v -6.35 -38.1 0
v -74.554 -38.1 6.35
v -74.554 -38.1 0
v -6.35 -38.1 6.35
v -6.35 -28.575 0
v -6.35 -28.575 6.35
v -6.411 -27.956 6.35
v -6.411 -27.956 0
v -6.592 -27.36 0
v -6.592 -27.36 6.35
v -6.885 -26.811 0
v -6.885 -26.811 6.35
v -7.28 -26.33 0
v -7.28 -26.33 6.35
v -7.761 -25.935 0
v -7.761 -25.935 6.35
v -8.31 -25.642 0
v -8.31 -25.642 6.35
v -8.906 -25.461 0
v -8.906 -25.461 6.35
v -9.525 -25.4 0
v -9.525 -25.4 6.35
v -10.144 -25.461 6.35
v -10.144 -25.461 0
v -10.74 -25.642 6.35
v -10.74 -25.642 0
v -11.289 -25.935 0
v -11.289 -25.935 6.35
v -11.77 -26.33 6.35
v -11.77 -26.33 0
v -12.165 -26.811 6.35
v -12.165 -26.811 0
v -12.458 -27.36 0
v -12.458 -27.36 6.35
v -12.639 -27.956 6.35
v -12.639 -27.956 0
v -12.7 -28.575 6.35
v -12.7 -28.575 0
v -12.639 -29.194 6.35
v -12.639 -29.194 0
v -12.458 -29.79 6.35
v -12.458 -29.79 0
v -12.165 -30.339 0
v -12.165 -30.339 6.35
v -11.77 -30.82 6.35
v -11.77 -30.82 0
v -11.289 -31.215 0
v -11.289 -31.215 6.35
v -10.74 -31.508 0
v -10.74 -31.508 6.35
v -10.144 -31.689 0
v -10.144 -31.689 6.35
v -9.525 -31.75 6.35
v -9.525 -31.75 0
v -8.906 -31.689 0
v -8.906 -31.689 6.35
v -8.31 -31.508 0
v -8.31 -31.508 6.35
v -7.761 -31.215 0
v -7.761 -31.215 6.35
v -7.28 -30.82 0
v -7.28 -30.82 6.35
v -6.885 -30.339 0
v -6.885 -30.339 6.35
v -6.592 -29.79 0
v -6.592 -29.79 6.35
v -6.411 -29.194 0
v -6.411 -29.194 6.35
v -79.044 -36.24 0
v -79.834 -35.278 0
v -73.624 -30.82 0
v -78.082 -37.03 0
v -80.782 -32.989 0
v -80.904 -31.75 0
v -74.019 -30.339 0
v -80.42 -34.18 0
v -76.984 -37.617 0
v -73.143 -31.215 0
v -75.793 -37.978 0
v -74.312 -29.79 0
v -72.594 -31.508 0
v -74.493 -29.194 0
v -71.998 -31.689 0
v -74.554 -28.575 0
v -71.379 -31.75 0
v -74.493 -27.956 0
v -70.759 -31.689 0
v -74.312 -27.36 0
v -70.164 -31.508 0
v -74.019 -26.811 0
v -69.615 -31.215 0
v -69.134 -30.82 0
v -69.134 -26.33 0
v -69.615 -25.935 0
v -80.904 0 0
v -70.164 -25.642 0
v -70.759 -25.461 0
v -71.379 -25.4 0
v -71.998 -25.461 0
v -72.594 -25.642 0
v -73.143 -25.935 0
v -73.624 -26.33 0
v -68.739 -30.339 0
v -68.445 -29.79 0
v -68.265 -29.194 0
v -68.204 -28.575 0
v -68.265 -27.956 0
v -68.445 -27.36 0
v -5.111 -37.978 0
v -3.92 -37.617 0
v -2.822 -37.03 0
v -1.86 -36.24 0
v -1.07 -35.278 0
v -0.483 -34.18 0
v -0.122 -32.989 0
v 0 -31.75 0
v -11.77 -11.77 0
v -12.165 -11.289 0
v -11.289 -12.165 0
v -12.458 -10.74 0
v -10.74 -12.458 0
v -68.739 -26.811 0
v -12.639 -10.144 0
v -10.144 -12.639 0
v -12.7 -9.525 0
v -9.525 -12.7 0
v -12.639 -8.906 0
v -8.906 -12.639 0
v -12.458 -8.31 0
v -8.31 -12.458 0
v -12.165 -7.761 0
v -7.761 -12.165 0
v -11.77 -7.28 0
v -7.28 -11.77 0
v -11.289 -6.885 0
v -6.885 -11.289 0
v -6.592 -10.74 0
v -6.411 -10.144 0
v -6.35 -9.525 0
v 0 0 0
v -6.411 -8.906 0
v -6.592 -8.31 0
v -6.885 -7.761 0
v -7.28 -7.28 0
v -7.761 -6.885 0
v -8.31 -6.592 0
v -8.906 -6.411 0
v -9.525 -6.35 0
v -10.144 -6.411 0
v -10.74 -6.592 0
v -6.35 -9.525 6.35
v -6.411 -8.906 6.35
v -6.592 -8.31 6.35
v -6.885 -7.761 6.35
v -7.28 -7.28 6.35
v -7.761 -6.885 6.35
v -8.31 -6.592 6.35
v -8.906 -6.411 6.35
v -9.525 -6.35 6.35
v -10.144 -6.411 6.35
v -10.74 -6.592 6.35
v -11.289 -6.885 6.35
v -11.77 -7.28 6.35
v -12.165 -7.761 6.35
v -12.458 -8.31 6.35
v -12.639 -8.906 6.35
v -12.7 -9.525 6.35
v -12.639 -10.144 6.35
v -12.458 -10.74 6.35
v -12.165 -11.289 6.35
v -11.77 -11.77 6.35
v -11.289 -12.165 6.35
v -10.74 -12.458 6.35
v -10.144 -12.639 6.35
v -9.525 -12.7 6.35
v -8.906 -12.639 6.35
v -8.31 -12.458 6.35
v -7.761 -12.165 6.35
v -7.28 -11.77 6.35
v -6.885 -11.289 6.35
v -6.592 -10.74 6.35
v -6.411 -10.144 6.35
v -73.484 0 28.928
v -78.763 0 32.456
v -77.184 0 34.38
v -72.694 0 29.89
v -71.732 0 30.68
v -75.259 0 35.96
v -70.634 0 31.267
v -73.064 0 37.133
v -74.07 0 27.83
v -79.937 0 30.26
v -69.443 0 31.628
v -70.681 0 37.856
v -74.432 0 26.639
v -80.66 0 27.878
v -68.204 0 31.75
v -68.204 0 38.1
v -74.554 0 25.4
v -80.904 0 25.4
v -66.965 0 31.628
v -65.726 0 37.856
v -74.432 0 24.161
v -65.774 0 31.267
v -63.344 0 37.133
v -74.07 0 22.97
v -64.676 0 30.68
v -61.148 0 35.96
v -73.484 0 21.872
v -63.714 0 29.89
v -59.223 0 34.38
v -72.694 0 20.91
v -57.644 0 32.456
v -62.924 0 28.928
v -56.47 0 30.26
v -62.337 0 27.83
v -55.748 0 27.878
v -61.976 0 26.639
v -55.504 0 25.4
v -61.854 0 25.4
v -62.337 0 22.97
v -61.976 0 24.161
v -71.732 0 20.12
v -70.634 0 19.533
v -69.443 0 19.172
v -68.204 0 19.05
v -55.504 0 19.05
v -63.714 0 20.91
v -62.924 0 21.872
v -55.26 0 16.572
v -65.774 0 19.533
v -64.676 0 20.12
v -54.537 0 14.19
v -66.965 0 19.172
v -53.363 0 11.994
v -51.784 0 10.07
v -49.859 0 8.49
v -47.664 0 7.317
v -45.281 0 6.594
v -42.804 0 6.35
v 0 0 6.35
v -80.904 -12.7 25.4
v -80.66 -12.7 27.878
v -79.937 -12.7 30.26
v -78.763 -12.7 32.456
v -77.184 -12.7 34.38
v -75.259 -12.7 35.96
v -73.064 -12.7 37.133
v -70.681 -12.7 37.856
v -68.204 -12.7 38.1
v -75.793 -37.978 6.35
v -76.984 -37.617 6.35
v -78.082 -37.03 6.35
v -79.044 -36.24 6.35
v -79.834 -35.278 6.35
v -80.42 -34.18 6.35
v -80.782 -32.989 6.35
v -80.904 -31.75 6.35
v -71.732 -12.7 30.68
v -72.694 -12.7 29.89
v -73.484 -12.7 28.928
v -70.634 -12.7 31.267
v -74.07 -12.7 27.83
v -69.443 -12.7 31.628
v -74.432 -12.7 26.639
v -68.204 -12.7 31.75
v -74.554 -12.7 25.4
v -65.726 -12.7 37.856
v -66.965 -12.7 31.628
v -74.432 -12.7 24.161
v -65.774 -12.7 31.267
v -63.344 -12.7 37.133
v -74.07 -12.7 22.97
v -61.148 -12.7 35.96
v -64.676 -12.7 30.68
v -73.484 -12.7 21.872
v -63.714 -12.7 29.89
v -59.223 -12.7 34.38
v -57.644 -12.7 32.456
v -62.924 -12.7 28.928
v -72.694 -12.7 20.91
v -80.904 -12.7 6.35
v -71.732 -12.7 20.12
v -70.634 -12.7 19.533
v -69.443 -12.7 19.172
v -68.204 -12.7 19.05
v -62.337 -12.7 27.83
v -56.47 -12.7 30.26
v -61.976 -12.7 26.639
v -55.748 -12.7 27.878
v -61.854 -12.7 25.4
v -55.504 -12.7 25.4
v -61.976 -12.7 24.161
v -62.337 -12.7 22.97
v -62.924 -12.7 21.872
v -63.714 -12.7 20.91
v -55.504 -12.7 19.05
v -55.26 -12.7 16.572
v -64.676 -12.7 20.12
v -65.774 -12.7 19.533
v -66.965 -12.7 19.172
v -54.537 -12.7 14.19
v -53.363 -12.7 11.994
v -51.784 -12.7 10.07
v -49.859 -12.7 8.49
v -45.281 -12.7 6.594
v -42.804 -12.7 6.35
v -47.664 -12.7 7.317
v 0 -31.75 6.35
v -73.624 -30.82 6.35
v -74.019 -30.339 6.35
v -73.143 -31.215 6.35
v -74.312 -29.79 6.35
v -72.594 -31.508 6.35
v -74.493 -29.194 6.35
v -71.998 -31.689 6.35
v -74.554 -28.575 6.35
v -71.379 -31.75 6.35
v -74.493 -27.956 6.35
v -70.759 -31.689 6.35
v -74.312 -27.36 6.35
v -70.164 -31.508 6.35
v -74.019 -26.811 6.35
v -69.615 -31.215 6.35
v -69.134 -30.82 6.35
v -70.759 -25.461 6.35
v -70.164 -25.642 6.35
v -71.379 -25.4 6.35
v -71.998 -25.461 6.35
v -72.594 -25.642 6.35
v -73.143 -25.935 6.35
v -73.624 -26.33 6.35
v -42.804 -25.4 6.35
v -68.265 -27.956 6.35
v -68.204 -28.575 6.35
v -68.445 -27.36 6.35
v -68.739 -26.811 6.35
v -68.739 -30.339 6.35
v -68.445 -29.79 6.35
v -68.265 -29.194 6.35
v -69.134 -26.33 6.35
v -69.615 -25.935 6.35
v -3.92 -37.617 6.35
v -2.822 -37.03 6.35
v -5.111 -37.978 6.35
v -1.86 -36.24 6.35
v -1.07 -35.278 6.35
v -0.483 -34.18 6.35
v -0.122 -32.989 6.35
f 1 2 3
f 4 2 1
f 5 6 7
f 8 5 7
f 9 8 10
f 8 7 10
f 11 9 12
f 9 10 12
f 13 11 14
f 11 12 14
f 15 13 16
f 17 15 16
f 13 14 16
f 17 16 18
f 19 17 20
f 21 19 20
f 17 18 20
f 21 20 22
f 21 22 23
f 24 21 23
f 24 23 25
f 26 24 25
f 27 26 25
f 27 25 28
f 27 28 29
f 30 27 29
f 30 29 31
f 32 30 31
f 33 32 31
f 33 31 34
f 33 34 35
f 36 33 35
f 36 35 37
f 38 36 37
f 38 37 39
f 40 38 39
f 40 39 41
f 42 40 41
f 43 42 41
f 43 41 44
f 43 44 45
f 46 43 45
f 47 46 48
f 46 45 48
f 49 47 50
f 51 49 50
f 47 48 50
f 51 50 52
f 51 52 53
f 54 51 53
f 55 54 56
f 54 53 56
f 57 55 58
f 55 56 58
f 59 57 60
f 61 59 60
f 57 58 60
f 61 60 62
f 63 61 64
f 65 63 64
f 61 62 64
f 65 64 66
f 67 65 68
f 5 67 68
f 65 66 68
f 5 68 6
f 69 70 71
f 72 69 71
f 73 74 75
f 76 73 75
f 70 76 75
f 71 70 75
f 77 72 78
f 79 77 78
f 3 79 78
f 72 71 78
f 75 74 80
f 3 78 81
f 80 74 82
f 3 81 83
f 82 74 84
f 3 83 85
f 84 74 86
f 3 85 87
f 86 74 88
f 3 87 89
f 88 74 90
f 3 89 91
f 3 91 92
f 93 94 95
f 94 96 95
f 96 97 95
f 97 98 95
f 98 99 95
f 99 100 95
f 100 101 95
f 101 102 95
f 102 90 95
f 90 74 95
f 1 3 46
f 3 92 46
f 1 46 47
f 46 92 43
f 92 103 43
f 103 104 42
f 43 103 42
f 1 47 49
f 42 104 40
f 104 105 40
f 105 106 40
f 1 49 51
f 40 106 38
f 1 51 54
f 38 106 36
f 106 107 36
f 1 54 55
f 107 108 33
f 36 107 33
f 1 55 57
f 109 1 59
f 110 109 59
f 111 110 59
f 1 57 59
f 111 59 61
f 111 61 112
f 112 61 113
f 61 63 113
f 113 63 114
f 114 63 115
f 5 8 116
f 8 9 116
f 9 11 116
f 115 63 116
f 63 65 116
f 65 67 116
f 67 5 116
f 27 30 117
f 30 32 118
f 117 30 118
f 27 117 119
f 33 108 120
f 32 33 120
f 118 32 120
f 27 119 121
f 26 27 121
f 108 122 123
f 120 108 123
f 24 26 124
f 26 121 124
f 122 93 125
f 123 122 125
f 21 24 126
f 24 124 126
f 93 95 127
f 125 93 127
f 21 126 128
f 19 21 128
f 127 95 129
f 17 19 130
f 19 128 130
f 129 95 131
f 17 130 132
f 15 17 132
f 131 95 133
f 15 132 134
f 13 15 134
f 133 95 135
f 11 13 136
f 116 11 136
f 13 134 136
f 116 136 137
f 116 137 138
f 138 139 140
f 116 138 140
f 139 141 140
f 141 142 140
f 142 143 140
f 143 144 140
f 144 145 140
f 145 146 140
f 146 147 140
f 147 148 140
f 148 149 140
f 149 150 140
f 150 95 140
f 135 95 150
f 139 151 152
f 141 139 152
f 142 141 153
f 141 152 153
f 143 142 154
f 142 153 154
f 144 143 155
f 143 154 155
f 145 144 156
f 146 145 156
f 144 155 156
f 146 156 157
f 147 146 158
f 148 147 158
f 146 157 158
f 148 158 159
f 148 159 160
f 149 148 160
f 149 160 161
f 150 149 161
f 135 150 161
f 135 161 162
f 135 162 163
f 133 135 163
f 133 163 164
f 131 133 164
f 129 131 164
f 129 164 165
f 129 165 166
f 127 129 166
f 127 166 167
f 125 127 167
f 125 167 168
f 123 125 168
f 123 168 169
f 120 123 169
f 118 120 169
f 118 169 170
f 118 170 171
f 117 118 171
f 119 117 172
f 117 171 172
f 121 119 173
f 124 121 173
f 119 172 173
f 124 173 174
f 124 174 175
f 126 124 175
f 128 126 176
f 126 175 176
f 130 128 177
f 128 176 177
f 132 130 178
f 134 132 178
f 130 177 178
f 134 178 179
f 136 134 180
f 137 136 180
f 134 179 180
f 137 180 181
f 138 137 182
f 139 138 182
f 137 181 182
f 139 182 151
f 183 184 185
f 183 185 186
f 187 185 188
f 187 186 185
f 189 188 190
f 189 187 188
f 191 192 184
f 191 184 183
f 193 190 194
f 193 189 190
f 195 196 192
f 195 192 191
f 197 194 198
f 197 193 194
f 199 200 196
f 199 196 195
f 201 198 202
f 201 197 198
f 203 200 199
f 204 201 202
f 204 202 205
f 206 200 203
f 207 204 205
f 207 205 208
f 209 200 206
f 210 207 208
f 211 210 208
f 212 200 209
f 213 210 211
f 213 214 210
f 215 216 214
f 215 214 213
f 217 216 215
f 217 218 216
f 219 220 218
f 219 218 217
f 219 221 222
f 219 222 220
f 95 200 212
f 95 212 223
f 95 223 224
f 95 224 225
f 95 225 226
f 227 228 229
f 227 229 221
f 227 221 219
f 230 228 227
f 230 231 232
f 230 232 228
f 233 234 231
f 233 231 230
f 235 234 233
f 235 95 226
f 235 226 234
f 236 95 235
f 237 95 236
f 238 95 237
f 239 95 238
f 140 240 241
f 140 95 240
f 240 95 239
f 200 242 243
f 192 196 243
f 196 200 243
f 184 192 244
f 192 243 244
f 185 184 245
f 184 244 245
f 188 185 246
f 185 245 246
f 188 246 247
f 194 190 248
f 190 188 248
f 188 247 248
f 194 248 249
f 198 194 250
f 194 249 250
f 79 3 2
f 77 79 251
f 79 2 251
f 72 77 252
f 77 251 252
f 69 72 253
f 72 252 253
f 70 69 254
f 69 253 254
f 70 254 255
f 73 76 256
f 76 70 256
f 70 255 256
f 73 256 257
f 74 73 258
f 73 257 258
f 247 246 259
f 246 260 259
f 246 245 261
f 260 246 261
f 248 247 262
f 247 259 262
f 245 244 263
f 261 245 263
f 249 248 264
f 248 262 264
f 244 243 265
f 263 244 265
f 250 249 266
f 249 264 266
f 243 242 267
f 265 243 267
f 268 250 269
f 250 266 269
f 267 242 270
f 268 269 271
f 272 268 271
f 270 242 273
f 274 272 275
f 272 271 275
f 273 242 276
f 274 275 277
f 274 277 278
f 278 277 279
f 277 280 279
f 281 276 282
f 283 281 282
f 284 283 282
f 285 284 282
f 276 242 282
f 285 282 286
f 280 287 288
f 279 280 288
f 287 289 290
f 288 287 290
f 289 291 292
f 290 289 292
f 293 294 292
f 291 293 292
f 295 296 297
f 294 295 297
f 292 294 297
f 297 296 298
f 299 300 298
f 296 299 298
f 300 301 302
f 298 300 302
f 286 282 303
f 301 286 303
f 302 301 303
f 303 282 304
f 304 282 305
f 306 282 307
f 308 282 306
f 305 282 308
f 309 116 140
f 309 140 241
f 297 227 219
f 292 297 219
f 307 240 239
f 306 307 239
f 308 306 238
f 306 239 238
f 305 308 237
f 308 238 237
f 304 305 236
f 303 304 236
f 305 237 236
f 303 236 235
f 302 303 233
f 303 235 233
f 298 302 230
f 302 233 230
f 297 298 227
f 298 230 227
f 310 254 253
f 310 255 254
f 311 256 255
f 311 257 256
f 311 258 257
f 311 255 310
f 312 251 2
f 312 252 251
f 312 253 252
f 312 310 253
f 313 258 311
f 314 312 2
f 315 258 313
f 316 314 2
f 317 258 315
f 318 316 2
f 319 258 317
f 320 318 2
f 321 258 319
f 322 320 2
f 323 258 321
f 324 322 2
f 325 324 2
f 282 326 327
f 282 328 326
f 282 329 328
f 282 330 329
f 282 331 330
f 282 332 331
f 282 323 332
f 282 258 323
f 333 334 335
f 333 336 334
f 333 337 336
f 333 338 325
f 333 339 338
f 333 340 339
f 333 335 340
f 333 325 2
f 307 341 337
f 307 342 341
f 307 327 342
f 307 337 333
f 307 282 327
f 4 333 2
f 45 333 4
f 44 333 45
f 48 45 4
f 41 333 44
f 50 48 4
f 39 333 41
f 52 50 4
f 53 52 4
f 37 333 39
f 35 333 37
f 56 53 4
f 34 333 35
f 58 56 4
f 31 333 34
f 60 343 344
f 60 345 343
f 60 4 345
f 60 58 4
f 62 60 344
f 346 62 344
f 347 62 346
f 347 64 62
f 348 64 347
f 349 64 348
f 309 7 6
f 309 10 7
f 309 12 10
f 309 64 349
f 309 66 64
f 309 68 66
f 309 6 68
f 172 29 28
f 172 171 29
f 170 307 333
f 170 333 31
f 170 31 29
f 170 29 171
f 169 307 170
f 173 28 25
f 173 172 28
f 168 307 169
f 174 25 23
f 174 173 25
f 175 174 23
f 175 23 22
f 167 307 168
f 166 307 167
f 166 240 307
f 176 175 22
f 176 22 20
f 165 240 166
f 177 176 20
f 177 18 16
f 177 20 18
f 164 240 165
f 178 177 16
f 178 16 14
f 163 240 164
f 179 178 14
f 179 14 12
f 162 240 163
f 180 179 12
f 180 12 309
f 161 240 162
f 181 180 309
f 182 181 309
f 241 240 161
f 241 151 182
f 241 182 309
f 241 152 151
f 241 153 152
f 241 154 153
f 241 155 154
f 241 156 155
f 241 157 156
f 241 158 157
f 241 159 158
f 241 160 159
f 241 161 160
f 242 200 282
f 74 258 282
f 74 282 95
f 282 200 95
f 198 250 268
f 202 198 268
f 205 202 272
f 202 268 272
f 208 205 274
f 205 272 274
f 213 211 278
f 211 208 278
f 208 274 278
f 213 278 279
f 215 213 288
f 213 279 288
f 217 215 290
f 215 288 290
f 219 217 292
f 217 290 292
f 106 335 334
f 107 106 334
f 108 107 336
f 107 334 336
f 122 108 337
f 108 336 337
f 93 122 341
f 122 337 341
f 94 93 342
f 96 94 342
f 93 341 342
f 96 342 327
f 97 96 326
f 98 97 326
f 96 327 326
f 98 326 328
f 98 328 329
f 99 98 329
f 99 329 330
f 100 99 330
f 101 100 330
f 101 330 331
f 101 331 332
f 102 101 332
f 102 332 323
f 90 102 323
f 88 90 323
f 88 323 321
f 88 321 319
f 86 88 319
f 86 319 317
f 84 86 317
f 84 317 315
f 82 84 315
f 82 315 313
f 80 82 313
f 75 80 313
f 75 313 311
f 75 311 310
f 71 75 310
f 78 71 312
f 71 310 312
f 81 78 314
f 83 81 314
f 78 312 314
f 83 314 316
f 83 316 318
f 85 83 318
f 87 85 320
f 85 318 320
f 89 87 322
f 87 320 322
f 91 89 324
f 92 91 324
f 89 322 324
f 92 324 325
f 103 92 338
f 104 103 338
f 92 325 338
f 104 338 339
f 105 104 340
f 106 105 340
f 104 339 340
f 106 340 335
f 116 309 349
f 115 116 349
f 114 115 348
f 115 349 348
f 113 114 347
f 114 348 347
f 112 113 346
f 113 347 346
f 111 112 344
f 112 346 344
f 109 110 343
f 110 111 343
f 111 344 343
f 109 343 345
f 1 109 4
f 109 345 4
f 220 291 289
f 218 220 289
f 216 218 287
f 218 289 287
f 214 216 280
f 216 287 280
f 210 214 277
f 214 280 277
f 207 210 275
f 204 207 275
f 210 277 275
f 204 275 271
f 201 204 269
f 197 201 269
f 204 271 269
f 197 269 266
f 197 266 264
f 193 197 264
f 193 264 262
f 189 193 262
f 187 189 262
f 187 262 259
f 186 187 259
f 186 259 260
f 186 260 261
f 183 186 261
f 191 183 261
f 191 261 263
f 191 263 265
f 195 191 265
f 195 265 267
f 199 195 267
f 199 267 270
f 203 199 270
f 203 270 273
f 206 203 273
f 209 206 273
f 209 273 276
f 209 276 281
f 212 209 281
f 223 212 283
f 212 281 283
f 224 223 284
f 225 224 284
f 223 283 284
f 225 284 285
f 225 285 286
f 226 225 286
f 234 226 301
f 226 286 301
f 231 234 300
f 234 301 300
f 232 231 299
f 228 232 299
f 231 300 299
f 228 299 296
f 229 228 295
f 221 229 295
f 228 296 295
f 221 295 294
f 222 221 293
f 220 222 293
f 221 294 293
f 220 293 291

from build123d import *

# Parameters (mm, degrees)
F1_DEPTH  = 38.1
F2_W      = 25.4
F2_H      = 25.4
F3_DEPTH  = 31.75
F4_W      = 12.7
F4_H      = 12.7
F5_DEPTH  = 12.7
F7_DEPTH  = 25.4
F9_DEPTH  = 25.4
F10_R     = 6.35
F11_DEPTH = 25.4
F12_R     = 3.175
F13_DEPTH = 25.4
F15_DEPTH = 25.4


with BuildPart() as f1:
    # F0 (on Front) → F1 (new body)
    with BuildSketch(Plane.XZ):
        Polygon((-80.9037027093, 0), (0, 0), (0, 6.35), (-55.5037027093, 6.35), (-55.5037027093, 38.1), (-80.9037027093, 38.1), align=None)
    extrude(amount=F1_DEPTH)

    # F2 (on face) → F3 (cut)
    with BuildSketch(Plane.XY.offset(38.1)):
        with Locations((-68.2037027093, -25.4)):
            Rectangle(F2_W, F2_H)
    extrude(amount=-F3_DEPTH, mode=Mode.SUBTRACT)

    # F4 (on face) → F5 (join)
    with BuildSketch(Plane.XY.offset(6.35)):
        with Locations((-49.1537027093, -6.35)):
            Rectangle(F4_W, F4_H)
    extrude(amount=F5_DEPTH)

    # F6 (on face) → F7 (cut)
    with BuildSketch(Plane(origin=(0, 0, 0), x_dir=(-1, 0, 0), z_dir=(0, 1, 0))):
        with BuildLine():
            ThreePointArc((42.8037027093, 6.35), (51.7839588303, 10.0697438789), (55.5037027093, 19.05))
            Line((55.5037027093, 19.05), (42.8037027093, 19.05))
            Line((42.8037027093, 19.05), (42.8037027093, 6.35))
        make_face()
    extrude(amount=-F7_DEPTH, mode=Mode.SUBTRACT)

    # F8 (on face) → F9 (cut)
    with BuildSketch(Plane.XZ.offset(12.7)):
        with BuildLine():
            ThreePointArc((-80.9037027093, 25.4), (-77.1839588303, 34.3802561211), (-68.2037027093, 38.1))
            Line((-68.2037027093, 38.1), (-80.9037027093, 38.1))
            Line((-80.9037027093, 38.1), (-80.9037027093, 25.4))
        make_face()
        with BuildLine():
            ThreePointArc((-68.2037027093, 38.1), (-59.2234465882, 34.3802561211), (-55.5037027093, 25.4))
            Line((-55.5037027093, 25.4), (-55.5037027093, 38.1))
            Line((-55.5037027093, 38.1), (-68.2037027093, 38.1))
        make_face()
    extrude(amount=-F9_DEPTH, mode=Mode.SUBTRACT)

    # F10 (on face) → F11 (cut)
    with BuildSketch(Plane.XZ.offset(12.7)):
        with Locations((-68.2037027093, 25.4)):
            Circle(F10_R)
    extrude(amount=-F11_DEPTH, mode=Mode.SUBTRACT)

    # F12 (on face) → F13 (cut)
    with BuildSketch(Plane.XY.offset(6.35)):
        with Locations((-9.525, -9.525)):
            Circle(F12_R)
        with Locations((-9.525, -28.575)):
            Circle(F12_R)
        with Locations((-71.3787027093, -28.575)):
            Circle(F12_R)
    extrude(amount=-F13_DEPTH, mode=Mode.SUBTRACT)

    # F14 (on face) → F15 (cut)
    with BuildSketch(Plane.XY.offset(6.35)):
        with BuildLine():
            Line((-80.9037027093, -38.1), (-74.5537027093, -38.1))
            ThreePointArc((-74.5537027093, -38.1), (-79.0438307698, -36.2401280605), (-80.9037027093, -31.75))
            Line((-80.9037027093, -31.75), (-80.9037027093, -38.1))
        make_face()
        with BuildLine():
            ThreePointArc((0, -31.75), (-1.8598719244, -36.2401280455), (-6.3499999575, -38.1))
            Line((-6.3499999575, -38.1), (0, -38.1))
            Line((0, -38.1), (0, -31.75))
        make_face()
    extrude(amount=-F15_DEPTH, mode=Mode.SUBTRACT)


solid = f1.part
